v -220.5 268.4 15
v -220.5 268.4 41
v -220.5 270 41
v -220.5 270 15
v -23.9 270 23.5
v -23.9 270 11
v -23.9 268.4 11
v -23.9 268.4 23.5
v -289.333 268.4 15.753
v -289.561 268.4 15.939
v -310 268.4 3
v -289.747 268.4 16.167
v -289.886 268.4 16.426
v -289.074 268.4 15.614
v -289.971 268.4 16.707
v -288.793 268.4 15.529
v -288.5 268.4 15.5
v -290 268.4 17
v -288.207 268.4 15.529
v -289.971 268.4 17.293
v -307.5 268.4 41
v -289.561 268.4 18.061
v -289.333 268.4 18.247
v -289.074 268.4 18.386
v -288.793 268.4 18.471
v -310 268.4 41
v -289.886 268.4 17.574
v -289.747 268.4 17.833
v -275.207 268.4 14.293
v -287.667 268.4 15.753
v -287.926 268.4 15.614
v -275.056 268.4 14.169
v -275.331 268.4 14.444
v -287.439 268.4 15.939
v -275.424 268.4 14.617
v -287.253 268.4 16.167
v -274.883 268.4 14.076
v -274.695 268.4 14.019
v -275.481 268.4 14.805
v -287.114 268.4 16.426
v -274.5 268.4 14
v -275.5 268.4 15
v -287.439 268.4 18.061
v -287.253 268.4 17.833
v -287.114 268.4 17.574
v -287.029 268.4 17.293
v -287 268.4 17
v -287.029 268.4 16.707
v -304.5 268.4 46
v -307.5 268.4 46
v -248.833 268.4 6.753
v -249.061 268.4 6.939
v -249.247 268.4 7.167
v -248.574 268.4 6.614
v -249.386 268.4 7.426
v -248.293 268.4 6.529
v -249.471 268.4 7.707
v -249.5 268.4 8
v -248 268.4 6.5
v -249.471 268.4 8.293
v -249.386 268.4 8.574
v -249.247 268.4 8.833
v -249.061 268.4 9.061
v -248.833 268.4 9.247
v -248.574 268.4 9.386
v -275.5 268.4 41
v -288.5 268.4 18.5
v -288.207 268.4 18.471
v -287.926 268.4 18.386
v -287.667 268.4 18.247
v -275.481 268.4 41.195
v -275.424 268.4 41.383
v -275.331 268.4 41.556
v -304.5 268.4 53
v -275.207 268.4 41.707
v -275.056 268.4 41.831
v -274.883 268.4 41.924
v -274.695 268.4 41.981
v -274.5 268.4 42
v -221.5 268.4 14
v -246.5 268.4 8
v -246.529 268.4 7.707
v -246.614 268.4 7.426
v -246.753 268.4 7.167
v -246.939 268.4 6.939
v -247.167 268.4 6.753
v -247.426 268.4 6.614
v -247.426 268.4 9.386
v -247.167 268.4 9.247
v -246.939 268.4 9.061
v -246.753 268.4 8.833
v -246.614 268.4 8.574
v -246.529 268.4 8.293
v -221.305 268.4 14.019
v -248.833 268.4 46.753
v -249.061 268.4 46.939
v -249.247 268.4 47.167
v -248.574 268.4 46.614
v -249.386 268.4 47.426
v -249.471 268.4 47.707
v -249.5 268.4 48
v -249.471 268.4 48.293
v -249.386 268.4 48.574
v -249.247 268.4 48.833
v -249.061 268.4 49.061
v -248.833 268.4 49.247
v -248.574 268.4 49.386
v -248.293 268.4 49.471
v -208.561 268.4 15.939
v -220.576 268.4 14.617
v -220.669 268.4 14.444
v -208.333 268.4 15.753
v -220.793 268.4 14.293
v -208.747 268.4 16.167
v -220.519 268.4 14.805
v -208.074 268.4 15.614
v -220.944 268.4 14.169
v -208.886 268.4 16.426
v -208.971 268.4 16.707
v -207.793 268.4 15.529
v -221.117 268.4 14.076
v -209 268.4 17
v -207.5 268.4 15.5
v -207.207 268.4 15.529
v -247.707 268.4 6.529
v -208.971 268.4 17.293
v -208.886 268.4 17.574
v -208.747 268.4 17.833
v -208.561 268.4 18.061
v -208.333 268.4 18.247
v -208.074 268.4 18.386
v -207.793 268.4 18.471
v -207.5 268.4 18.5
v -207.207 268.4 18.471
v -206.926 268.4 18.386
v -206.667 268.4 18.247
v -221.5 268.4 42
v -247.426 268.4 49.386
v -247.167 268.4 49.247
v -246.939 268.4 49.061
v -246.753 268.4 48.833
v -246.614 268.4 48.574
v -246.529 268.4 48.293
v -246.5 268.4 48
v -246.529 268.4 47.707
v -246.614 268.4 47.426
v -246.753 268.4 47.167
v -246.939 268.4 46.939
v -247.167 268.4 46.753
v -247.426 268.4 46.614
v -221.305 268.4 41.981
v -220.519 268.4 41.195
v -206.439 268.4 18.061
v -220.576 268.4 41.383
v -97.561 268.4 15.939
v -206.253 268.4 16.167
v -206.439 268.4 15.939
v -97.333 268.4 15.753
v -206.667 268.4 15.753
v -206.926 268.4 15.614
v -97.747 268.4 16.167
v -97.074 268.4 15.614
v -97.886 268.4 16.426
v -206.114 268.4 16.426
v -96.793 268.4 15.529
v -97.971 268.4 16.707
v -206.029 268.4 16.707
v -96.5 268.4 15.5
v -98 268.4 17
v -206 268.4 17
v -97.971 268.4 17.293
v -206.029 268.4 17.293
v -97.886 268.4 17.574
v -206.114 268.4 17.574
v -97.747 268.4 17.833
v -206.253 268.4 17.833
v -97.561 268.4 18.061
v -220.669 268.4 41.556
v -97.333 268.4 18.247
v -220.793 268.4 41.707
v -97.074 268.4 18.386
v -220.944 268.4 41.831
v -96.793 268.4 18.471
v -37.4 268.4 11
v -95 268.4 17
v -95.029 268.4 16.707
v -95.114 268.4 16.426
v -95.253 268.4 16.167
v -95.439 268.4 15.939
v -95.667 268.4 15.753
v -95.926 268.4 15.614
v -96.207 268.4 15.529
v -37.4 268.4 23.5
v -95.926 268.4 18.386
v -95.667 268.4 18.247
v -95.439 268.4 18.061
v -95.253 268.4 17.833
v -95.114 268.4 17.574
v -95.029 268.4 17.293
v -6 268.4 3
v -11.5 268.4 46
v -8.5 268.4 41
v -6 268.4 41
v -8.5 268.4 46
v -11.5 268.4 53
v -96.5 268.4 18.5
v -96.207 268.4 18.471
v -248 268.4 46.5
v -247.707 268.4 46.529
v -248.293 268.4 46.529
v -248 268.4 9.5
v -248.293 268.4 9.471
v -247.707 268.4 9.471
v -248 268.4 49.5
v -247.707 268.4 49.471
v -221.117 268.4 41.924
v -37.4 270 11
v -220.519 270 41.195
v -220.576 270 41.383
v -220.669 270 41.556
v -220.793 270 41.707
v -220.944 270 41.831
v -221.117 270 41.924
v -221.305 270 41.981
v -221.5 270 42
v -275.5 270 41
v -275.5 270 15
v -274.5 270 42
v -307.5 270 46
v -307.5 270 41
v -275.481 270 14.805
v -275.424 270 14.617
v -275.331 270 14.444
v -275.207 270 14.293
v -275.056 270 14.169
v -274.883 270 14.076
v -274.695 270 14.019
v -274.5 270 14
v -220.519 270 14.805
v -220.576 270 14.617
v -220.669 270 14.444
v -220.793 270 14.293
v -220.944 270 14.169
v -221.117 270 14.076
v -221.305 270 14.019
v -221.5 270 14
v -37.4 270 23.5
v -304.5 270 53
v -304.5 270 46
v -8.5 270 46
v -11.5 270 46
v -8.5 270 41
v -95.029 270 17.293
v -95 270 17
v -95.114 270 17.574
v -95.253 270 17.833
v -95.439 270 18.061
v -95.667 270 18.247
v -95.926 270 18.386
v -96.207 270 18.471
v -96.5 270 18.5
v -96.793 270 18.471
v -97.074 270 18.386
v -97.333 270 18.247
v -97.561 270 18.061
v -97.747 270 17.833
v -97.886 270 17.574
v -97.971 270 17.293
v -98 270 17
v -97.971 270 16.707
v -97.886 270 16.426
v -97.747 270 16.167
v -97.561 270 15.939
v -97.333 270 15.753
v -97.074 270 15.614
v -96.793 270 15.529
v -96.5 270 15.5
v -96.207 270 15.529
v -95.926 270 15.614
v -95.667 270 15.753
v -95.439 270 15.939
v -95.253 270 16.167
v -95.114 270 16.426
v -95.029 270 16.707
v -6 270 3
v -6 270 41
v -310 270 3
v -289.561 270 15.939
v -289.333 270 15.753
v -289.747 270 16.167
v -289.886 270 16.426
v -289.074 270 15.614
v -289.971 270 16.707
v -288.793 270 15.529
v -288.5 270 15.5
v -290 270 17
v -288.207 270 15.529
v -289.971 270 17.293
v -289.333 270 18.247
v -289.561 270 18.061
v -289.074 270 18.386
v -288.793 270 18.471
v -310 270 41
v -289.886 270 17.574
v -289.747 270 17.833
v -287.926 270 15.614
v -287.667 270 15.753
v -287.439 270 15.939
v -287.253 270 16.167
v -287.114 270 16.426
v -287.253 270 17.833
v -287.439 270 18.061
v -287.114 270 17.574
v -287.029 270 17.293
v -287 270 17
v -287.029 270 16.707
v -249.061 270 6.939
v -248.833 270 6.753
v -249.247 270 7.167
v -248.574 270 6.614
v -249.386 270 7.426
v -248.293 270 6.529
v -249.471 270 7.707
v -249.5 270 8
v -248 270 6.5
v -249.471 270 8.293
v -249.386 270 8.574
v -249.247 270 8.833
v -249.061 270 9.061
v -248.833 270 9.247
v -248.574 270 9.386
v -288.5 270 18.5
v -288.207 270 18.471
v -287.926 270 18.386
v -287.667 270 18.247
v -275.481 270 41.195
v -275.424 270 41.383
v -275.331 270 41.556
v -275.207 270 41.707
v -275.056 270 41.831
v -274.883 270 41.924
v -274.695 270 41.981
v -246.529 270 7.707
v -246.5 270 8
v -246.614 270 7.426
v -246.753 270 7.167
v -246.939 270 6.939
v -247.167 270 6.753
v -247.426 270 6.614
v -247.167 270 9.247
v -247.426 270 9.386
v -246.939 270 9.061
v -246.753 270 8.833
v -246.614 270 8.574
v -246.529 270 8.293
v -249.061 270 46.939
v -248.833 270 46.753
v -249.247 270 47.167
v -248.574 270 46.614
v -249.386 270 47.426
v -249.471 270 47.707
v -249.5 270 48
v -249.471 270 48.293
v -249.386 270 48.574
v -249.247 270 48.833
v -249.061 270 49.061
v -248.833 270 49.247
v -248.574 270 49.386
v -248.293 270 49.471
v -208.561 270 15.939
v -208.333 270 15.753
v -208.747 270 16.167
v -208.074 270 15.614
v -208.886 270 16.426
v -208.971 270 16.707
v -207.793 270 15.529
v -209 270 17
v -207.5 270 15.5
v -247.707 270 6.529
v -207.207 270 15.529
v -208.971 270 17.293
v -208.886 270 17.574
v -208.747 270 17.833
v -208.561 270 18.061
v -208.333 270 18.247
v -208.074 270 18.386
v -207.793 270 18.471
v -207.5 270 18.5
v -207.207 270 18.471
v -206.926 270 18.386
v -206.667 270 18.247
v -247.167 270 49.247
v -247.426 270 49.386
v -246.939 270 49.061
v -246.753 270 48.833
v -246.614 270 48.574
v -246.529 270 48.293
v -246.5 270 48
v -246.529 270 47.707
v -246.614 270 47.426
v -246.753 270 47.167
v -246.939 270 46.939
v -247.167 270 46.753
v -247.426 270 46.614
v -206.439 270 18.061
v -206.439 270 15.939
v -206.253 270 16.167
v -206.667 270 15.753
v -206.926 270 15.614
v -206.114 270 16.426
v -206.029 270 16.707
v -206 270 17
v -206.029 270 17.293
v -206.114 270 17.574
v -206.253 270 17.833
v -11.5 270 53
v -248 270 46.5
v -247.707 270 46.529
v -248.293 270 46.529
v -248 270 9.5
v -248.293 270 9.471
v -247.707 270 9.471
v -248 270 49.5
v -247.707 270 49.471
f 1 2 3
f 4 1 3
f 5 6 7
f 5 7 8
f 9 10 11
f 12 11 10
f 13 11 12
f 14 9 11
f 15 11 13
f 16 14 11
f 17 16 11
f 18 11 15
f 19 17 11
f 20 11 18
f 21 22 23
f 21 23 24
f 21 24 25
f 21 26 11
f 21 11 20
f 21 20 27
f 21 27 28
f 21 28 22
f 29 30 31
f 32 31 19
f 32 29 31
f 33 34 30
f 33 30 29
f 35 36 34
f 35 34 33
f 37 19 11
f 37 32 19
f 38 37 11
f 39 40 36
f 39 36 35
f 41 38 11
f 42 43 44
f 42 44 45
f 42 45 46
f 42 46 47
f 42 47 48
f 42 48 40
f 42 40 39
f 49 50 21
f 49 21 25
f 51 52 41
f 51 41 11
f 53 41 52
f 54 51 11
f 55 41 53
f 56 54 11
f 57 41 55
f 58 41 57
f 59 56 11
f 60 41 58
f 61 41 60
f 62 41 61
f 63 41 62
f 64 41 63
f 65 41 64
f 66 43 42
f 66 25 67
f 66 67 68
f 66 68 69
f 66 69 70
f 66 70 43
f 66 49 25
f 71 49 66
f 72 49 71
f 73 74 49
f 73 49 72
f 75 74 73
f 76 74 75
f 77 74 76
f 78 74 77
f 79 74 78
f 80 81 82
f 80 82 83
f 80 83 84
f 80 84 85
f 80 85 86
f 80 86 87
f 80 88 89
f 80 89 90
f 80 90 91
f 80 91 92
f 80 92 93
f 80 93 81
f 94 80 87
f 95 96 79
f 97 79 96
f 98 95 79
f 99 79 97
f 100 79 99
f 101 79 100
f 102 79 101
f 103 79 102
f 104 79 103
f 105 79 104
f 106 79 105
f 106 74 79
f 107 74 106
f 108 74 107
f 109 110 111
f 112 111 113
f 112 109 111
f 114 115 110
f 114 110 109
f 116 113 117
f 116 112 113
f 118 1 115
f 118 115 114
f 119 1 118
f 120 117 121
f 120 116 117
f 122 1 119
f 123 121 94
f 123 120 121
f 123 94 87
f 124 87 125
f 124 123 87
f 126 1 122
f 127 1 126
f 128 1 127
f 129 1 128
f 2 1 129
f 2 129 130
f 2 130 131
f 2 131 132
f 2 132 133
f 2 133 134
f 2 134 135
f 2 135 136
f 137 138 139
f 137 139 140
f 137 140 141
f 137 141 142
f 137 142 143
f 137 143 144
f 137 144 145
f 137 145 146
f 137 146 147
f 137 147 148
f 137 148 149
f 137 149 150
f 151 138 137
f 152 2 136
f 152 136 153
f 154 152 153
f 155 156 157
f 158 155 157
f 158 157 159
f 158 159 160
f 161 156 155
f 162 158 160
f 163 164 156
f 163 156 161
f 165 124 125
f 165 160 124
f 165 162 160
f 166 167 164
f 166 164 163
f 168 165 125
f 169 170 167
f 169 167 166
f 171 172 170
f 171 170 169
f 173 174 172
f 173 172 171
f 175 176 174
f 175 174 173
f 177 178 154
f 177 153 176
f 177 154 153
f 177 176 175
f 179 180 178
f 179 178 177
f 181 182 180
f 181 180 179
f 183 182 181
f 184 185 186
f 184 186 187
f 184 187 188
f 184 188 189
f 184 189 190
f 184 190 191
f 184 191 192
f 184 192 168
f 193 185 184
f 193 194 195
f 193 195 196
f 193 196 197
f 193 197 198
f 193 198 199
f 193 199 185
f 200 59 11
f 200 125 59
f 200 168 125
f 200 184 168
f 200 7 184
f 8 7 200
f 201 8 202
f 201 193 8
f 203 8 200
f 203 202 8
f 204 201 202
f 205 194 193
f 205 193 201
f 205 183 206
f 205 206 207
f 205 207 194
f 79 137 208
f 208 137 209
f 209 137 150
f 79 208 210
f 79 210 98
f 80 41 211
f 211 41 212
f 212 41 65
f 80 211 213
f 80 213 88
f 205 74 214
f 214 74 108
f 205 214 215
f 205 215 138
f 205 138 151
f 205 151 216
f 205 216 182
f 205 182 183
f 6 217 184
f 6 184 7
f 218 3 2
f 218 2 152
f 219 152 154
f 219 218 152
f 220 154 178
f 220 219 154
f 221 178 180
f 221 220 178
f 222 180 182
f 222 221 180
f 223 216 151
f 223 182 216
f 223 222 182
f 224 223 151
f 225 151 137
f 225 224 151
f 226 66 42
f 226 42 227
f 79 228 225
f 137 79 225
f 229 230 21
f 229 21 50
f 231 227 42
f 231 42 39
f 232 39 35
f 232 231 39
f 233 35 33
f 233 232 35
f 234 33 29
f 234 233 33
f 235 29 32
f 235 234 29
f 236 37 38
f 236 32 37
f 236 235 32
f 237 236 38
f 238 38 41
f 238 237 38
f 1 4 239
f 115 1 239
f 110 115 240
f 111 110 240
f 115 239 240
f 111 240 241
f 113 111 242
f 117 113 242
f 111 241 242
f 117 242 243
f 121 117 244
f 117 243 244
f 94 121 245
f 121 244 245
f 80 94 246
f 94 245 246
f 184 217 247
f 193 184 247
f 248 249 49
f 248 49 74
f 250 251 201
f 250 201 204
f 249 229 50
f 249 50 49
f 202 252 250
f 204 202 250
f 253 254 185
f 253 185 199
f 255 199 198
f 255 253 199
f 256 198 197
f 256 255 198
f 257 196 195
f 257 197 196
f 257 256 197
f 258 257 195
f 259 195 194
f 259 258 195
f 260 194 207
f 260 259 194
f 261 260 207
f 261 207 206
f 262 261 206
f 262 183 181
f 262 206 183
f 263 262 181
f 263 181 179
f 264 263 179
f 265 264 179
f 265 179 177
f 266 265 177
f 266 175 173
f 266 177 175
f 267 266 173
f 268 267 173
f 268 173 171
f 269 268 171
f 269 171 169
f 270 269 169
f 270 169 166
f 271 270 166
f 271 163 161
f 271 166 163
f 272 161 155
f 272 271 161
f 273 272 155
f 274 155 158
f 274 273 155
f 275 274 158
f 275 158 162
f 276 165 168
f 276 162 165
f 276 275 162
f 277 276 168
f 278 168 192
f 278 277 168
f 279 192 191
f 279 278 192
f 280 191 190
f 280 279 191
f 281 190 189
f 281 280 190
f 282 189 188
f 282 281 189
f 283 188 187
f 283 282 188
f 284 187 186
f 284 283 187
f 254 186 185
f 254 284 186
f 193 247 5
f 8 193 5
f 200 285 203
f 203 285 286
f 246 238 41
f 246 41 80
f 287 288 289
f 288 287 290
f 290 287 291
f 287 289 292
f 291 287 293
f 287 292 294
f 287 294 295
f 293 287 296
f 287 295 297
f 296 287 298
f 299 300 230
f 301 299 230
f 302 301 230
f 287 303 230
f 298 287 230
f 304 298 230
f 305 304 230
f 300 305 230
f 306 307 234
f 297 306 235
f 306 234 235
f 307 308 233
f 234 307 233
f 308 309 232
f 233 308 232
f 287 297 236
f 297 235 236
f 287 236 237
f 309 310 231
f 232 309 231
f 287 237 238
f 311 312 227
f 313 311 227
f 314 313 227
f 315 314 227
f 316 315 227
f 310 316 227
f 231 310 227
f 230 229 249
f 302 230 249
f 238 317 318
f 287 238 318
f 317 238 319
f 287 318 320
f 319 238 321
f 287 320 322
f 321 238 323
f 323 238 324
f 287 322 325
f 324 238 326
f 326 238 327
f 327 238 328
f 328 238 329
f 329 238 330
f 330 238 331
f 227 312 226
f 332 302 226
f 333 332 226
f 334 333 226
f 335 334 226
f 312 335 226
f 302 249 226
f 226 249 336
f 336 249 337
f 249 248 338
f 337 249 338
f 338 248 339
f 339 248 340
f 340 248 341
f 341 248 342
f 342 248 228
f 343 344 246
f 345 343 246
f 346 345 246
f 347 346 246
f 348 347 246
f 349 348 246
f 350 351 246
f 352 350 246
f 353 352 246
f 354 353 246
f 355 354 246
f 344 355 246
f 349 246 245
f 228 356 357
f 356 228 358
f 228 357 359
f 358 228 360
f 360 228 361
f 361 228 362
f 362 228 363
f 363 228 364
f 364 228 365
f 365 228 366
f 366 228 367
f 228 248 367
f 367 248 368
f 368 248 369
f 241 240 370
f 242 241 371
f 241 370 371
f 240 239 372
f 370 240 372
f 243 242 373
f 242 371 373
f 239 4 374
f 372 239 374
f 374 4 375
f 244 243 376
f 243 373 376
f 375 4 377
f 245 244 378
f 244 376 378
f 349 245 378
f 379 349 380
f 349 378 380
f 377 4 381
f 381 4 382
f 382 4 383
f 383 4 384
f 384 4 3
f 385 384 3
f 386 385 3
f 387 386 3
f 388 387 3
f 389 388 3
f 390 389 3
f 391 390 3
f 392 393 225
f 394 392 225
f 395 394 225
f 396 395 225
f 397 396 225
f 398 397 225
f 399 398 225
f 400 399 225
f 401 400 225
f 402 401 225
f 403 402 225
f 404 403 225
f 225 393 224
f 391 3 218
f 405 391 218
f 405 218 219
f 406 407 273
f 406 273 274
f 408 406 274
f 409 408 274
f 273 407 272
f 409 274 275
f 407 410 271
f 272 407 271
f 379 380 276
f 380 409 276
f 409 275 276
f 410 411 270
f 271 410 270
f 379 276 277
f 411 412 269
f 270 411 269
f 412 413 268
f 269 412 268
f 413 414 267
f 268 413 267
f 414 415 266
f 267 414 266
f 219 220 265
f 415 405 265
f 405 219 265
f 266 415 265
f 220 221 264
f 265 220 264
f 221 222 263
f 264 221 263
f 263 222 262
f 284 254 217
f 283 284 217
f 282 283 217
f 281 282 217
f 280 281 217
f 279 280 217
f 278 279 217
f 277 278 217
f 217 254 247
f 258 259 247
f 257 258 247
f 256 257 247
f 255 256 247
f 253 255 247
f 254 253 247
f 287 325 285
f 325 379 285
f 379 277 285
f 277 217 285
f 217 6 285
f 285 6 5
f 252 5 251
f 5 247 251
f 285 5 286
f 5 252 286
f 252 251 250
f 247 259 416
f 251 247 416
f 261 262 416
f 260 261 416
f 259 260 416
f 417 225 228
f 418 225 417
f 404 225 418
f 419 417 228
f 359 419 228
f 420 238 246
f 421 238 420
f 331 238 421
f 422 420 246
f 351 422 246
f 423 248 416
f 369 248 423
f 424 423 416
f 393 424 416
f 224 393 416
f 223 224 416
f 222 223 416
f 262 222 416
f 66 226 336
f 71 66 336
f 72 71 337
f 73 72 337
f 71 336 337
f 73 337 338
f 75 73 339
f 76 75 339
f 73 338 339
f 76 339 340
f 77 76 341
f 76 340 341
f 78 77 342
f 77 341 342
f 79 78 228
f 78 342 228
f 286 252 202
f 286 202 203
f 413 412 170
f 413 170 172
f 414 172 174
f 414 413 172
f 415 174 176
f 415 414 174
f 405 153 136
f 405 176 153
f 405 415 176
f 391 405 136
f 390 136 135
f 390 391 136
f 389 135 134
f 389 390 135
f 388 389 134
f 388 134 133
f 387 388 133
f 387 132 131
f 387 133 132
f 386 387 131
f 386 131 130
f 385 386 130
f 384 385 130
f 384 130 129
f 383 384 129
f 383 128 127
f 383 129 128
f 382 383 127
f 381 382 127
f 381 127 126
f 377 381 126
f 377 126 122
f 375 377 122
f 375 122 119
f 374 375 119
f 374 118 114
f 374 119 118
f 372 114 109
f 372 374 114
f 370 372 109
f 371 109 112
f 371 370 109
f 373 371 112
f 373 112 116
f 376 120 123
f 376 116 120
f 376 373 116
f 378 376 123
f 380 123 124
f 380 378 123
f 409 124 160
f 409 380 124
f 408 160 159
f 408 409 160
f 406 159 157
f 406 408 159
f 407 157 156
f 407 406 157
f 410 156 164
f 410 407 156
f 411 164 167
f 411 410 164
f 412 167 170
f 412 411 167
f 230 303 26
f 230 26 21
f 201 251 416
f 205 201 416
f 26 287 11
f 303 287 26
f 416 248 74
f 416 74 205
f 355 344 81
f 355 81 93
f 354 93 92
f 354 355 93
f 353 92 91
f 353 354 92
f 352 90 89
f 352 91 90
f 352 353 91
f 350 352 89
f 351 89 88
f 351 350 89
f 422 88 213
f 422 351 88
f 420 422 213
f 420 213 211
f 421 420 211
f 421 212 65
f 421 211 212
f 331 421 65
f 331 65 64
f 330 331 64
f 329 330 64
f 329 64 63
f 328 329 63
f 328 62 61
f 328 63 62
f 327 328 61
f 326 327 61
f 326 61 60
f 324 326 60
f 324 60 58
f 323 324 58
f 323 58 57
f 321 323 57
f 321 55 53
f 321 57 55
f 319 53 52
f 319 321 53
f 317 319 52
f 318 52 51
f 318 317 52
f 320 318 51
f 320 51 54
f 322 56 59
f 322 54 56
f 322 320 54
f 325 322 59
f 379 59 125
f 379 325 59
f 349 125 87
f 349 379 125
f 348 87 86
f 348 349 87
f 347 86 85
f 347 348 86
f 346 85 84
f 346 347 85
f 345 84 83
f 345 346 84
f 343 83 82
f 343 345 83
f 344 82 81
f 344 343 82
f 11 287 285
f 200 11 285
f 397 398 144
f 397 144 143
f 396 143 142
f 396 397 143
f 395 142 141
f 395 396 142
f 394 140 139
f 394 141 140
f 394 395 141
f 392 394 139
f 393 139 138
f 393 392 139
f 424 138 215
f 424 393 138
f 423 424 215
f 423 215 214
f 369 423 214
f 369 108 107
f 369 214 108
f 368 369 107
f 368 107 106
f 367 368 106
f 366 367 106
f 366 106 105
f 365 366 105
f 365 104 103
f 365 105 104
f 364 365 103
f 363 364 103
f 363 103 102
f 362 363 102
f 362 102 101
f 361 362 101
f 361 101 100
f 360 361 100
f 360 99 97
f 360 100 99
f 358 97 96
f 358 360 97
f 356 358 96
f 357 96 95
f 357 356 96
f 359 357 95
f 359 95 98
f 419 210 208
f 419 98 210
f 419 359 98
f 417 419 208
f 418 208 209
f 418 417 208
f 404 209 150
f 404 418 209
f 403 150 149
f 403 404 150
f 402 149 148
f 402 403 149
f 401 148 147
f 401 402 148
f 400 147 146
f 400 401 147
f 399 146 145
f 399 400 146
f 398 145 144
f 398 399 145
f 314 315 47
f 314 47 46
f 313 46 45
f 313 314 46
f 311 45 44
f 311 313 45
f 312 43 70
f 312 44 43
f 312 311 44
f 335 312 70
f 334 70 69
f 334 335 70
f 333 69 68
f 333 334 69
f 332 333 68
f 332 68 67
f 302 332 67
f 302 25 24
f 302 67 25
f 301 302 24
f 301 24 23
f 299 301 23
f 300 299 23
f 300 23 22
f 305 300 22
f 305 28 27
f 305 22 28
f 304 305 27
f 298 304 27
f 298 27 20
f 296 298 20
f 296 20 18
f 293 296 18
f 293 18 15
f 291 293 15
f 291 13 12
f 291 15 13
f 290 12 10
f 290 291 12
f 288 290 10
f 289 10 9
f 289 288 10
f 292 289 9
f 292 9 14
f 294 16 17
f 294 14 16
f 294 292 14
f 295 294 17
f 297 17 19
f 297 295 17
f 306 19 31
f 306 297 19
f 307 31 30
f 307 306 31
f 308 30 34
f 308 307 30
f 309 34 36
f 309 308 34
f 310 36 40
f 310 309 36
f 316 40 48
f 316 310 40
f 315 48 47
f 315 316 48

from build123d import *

# Parameters (mm, degrees)
BOX013_W                   = 13.5
BOX013_H                   = 12.5
BOX013_DEPTH               = 2
BOX015001005_W             = 55
BOX015001005_H             = 4
BOX015001005_DEPTH         = 28
FILLET001_R                = 1
CYLINDER012029001024_R     = 1.5
CYLINDER012029001024_DEPTH = 6
CYLINDER012029001025_R     = 1.5
CYLINDER012029001025_DEPTH = 6
CYLINDER012029001026_R     = 1.5
CYLINDER012029001026_DEPTH = 6
CYLINDER012029001028_R     = 1.5
CYLINDER012029001028_DEPTH = 6
BOX015001024_W             = 5.5
BOX015001024_H             = 7
BOX015001024_DEPTH         = 2
BOX015001023_W             = 2.5
BOX015001023_H             = 12
BOX015001023_DEPTH         = 2
BOX015001022_W             = 5.5
BOX015001022_H             = 7
BOX015001022_DEPTH         = 2
CYLINDER012029001027_R     = 1.5
CYLINDER012029001027_DEPTH = 6
BOX015001025_W             = 2.5
BOX015001025_H             = 12
BOX015001025_DEPTH         = 2
BOX012_W                   = 304
BOX012_H                   = 50
BOX012_DEPTH               = 1.6


with BuildPart() as cube002:
    # Box013 → Box013 (new body)
    with BuildSketch(Plane(origin=(-37.4, 270.2, 11), x_dir=(1, 0, 0), z_dir=(0, -1, 0))):
        with Locations((6.75, 6.25)):
            Rectangle(BOX013_W, BOX013_H)
    extrude(amount=BOX013_DEPTH)


with BuildPart() as fillet001:
    # Box015001005 → Box015001005 (new body)
    with BuildSketch(Plane(origin=(-275.5, 267, 14), x_dir=(1, 0, 0), z_dir=(0, 0, 1))):
        with Locations((27.5, 2)):
            Rectangle(BOX015001005_W, BOX015001005_H)
    extrude(amount=BOX015001005_DEPTH)

    # Fillet001
    fillet001_edges = [fillet001.edges().sort_by_distance(p)[0] for p in [
        (-275.5, 269, 42),
        (-275.5, 269, 14),
        (-220.5, 269, 42),
        (-220.5, 269, 14),
    ]]
    fillet(fillet001_edges, radius=FILLET001_R)


with BuildPart() as cylinder012029001024:
    # Cylinder012029001024 → Cylinder012029001024 (new body)
    with BuildSketch(Plane(origin=(-248, 271, 8), x_dir=(1, 0, 0), z_dir=(0, -1, 0))):
        Circle(CYLINDER012029001024_R)
    extrude(amount=CYLINDER012029001024_DEPTH)


with BuildPart() as cylinder012029001025:
    # Cylinder012029001025 → Cylinder012029001025 (new body)
    with BuildSketch(Plane(origin=(-248, 271, 48), x_dir=(1, 0, 0), z_dir=(0, -1, 0))):
        Circle(CYLINDER012029001025_R)
    extrude(amount=CYLINDER012029001025_DEPTH)


with BuildPart() as cylinder012029001026:
    # Cylinder012029001026 → Cylinder012029001026 (new body)
    with BuildSketch(Plane(origin=(-288.5, 271, 17), x_dir=(1, 0, 0), z_dir=(0, -1, 0))):
        Circle(CYLINDER012029001026_R)
    extrude(amount=CYLINDER012029001026_DEPTH)


with BuildPart() as cylinder012029001028:
    # Cylinder012029001028 → Cylinder012029001028 (new body)
    with BuildSketch(Plane(origin=(-96.5, 271, 17), x_dir=(1, 0, 0), z_dir=(0, -1, 0))):
        Circle(CYLINDER012029001028_R)
    extrude(amount=CYLINDER012029001028_DEPTH)


with BuildPart() as cube021:
    # Box015001024 → Box015001024 (new body)
    with BuildSketch(Plane(origin=(-310, 270.2, 46), x_dir=(1, 0, 0), z_dir=(0, -1, 0))):
        with Locations((2.75, 3.5)):
            Rectangle(BOX015001024_W, BOX015001024_H)
    extrude(amount=BOX015001024_DEPTH)


with BuildPart() as cube020:
    # Box015001023 → Box015001023 (new body)
    with BuildSketch(Plane(origin=(-8.5, 270.2, 41), x_dir=(1, 0, 0), z_dir=(0, -1, 0))):
        with Locations((1.25, 6)):
            Rectangle(BOX015001023_W, BOX015001023_H)
    extrude(amount=BOX015001023_DEPTH)


with BuildPart() as cube019:
    # Box015001022 → Box015001022 (new body)
    with BuildSketch(Plane(origin=(-11.5, 270.2, 46), x_dir=(1, 0, 0), z_dir=(0, -1, 0))):
        with Locations((2.75, 3.5)):
            Rectangle(BOX015001022_W, BOX015001022_H)
    extrude(amount=BOX015001022_DEPTH)


with BuildPart() as cylinder012029001027:
    # Cylinder012029001027 → Cylinder012029001027 (new body)
    with BuildSketch(Plane(origin=(-207.5, 271, 17), x_dir=(1, 0, 0), z_dir=(0, -1, 0))):
        Circle(CYLINDER012029001027_R)
    extrude(amount=CYLINDER012029001027_DEPTH)


with BuildPart() as fusion001012:
    # Box015001025 → Box015001025 (new body)
    with BuildSketch(Plane(origin=(-310, 270.2, 41), x_dir=(1, 0, 0), z_dir=(0, -1, 0))):
        with Locations((1.25, 6)):
            Rectangle(BOX015001025_W, BOX015001025_H)
    extrude(amount=BOX015001025_DEPTH)

    # Fusion001012: union Cube002, Fillet001, Cylinder012029001024, Cylinder012029001025, Cylinder012029001026, Cylinder012029001028, Cube021, Cube020, Cube019, Cylinder012029001027
    add(cube002.part)
    add(fillet001.part)
    add(cylinder012029001024.part)
    add(cylinder012029001025.part)
    add(cylinder012029001026.part)
    add(cylinder012029001028.part)
    add(cube021.part)
    add(cube020.part)
    add(cube019.part)
    add(cylinder012029001027.part)


with BuildPart() as cut003025:
    # Box012 → Box012 (new body)
    with BuildSketch(Plane(origin=(-310, 270, 3), x_dir=(1, 0, 0), z_dir=(0, -1, 0))):
        with Locations((152, 25)):
            Rectangle(BOX012_W, BOX012_H)
    extrude(amount=BOX012_DEPTH)

    # Cut003025: cut Fusion001012
    add(fusion001012.part, mode=Mode.SUBTRACT)


solid = cut003025.part
